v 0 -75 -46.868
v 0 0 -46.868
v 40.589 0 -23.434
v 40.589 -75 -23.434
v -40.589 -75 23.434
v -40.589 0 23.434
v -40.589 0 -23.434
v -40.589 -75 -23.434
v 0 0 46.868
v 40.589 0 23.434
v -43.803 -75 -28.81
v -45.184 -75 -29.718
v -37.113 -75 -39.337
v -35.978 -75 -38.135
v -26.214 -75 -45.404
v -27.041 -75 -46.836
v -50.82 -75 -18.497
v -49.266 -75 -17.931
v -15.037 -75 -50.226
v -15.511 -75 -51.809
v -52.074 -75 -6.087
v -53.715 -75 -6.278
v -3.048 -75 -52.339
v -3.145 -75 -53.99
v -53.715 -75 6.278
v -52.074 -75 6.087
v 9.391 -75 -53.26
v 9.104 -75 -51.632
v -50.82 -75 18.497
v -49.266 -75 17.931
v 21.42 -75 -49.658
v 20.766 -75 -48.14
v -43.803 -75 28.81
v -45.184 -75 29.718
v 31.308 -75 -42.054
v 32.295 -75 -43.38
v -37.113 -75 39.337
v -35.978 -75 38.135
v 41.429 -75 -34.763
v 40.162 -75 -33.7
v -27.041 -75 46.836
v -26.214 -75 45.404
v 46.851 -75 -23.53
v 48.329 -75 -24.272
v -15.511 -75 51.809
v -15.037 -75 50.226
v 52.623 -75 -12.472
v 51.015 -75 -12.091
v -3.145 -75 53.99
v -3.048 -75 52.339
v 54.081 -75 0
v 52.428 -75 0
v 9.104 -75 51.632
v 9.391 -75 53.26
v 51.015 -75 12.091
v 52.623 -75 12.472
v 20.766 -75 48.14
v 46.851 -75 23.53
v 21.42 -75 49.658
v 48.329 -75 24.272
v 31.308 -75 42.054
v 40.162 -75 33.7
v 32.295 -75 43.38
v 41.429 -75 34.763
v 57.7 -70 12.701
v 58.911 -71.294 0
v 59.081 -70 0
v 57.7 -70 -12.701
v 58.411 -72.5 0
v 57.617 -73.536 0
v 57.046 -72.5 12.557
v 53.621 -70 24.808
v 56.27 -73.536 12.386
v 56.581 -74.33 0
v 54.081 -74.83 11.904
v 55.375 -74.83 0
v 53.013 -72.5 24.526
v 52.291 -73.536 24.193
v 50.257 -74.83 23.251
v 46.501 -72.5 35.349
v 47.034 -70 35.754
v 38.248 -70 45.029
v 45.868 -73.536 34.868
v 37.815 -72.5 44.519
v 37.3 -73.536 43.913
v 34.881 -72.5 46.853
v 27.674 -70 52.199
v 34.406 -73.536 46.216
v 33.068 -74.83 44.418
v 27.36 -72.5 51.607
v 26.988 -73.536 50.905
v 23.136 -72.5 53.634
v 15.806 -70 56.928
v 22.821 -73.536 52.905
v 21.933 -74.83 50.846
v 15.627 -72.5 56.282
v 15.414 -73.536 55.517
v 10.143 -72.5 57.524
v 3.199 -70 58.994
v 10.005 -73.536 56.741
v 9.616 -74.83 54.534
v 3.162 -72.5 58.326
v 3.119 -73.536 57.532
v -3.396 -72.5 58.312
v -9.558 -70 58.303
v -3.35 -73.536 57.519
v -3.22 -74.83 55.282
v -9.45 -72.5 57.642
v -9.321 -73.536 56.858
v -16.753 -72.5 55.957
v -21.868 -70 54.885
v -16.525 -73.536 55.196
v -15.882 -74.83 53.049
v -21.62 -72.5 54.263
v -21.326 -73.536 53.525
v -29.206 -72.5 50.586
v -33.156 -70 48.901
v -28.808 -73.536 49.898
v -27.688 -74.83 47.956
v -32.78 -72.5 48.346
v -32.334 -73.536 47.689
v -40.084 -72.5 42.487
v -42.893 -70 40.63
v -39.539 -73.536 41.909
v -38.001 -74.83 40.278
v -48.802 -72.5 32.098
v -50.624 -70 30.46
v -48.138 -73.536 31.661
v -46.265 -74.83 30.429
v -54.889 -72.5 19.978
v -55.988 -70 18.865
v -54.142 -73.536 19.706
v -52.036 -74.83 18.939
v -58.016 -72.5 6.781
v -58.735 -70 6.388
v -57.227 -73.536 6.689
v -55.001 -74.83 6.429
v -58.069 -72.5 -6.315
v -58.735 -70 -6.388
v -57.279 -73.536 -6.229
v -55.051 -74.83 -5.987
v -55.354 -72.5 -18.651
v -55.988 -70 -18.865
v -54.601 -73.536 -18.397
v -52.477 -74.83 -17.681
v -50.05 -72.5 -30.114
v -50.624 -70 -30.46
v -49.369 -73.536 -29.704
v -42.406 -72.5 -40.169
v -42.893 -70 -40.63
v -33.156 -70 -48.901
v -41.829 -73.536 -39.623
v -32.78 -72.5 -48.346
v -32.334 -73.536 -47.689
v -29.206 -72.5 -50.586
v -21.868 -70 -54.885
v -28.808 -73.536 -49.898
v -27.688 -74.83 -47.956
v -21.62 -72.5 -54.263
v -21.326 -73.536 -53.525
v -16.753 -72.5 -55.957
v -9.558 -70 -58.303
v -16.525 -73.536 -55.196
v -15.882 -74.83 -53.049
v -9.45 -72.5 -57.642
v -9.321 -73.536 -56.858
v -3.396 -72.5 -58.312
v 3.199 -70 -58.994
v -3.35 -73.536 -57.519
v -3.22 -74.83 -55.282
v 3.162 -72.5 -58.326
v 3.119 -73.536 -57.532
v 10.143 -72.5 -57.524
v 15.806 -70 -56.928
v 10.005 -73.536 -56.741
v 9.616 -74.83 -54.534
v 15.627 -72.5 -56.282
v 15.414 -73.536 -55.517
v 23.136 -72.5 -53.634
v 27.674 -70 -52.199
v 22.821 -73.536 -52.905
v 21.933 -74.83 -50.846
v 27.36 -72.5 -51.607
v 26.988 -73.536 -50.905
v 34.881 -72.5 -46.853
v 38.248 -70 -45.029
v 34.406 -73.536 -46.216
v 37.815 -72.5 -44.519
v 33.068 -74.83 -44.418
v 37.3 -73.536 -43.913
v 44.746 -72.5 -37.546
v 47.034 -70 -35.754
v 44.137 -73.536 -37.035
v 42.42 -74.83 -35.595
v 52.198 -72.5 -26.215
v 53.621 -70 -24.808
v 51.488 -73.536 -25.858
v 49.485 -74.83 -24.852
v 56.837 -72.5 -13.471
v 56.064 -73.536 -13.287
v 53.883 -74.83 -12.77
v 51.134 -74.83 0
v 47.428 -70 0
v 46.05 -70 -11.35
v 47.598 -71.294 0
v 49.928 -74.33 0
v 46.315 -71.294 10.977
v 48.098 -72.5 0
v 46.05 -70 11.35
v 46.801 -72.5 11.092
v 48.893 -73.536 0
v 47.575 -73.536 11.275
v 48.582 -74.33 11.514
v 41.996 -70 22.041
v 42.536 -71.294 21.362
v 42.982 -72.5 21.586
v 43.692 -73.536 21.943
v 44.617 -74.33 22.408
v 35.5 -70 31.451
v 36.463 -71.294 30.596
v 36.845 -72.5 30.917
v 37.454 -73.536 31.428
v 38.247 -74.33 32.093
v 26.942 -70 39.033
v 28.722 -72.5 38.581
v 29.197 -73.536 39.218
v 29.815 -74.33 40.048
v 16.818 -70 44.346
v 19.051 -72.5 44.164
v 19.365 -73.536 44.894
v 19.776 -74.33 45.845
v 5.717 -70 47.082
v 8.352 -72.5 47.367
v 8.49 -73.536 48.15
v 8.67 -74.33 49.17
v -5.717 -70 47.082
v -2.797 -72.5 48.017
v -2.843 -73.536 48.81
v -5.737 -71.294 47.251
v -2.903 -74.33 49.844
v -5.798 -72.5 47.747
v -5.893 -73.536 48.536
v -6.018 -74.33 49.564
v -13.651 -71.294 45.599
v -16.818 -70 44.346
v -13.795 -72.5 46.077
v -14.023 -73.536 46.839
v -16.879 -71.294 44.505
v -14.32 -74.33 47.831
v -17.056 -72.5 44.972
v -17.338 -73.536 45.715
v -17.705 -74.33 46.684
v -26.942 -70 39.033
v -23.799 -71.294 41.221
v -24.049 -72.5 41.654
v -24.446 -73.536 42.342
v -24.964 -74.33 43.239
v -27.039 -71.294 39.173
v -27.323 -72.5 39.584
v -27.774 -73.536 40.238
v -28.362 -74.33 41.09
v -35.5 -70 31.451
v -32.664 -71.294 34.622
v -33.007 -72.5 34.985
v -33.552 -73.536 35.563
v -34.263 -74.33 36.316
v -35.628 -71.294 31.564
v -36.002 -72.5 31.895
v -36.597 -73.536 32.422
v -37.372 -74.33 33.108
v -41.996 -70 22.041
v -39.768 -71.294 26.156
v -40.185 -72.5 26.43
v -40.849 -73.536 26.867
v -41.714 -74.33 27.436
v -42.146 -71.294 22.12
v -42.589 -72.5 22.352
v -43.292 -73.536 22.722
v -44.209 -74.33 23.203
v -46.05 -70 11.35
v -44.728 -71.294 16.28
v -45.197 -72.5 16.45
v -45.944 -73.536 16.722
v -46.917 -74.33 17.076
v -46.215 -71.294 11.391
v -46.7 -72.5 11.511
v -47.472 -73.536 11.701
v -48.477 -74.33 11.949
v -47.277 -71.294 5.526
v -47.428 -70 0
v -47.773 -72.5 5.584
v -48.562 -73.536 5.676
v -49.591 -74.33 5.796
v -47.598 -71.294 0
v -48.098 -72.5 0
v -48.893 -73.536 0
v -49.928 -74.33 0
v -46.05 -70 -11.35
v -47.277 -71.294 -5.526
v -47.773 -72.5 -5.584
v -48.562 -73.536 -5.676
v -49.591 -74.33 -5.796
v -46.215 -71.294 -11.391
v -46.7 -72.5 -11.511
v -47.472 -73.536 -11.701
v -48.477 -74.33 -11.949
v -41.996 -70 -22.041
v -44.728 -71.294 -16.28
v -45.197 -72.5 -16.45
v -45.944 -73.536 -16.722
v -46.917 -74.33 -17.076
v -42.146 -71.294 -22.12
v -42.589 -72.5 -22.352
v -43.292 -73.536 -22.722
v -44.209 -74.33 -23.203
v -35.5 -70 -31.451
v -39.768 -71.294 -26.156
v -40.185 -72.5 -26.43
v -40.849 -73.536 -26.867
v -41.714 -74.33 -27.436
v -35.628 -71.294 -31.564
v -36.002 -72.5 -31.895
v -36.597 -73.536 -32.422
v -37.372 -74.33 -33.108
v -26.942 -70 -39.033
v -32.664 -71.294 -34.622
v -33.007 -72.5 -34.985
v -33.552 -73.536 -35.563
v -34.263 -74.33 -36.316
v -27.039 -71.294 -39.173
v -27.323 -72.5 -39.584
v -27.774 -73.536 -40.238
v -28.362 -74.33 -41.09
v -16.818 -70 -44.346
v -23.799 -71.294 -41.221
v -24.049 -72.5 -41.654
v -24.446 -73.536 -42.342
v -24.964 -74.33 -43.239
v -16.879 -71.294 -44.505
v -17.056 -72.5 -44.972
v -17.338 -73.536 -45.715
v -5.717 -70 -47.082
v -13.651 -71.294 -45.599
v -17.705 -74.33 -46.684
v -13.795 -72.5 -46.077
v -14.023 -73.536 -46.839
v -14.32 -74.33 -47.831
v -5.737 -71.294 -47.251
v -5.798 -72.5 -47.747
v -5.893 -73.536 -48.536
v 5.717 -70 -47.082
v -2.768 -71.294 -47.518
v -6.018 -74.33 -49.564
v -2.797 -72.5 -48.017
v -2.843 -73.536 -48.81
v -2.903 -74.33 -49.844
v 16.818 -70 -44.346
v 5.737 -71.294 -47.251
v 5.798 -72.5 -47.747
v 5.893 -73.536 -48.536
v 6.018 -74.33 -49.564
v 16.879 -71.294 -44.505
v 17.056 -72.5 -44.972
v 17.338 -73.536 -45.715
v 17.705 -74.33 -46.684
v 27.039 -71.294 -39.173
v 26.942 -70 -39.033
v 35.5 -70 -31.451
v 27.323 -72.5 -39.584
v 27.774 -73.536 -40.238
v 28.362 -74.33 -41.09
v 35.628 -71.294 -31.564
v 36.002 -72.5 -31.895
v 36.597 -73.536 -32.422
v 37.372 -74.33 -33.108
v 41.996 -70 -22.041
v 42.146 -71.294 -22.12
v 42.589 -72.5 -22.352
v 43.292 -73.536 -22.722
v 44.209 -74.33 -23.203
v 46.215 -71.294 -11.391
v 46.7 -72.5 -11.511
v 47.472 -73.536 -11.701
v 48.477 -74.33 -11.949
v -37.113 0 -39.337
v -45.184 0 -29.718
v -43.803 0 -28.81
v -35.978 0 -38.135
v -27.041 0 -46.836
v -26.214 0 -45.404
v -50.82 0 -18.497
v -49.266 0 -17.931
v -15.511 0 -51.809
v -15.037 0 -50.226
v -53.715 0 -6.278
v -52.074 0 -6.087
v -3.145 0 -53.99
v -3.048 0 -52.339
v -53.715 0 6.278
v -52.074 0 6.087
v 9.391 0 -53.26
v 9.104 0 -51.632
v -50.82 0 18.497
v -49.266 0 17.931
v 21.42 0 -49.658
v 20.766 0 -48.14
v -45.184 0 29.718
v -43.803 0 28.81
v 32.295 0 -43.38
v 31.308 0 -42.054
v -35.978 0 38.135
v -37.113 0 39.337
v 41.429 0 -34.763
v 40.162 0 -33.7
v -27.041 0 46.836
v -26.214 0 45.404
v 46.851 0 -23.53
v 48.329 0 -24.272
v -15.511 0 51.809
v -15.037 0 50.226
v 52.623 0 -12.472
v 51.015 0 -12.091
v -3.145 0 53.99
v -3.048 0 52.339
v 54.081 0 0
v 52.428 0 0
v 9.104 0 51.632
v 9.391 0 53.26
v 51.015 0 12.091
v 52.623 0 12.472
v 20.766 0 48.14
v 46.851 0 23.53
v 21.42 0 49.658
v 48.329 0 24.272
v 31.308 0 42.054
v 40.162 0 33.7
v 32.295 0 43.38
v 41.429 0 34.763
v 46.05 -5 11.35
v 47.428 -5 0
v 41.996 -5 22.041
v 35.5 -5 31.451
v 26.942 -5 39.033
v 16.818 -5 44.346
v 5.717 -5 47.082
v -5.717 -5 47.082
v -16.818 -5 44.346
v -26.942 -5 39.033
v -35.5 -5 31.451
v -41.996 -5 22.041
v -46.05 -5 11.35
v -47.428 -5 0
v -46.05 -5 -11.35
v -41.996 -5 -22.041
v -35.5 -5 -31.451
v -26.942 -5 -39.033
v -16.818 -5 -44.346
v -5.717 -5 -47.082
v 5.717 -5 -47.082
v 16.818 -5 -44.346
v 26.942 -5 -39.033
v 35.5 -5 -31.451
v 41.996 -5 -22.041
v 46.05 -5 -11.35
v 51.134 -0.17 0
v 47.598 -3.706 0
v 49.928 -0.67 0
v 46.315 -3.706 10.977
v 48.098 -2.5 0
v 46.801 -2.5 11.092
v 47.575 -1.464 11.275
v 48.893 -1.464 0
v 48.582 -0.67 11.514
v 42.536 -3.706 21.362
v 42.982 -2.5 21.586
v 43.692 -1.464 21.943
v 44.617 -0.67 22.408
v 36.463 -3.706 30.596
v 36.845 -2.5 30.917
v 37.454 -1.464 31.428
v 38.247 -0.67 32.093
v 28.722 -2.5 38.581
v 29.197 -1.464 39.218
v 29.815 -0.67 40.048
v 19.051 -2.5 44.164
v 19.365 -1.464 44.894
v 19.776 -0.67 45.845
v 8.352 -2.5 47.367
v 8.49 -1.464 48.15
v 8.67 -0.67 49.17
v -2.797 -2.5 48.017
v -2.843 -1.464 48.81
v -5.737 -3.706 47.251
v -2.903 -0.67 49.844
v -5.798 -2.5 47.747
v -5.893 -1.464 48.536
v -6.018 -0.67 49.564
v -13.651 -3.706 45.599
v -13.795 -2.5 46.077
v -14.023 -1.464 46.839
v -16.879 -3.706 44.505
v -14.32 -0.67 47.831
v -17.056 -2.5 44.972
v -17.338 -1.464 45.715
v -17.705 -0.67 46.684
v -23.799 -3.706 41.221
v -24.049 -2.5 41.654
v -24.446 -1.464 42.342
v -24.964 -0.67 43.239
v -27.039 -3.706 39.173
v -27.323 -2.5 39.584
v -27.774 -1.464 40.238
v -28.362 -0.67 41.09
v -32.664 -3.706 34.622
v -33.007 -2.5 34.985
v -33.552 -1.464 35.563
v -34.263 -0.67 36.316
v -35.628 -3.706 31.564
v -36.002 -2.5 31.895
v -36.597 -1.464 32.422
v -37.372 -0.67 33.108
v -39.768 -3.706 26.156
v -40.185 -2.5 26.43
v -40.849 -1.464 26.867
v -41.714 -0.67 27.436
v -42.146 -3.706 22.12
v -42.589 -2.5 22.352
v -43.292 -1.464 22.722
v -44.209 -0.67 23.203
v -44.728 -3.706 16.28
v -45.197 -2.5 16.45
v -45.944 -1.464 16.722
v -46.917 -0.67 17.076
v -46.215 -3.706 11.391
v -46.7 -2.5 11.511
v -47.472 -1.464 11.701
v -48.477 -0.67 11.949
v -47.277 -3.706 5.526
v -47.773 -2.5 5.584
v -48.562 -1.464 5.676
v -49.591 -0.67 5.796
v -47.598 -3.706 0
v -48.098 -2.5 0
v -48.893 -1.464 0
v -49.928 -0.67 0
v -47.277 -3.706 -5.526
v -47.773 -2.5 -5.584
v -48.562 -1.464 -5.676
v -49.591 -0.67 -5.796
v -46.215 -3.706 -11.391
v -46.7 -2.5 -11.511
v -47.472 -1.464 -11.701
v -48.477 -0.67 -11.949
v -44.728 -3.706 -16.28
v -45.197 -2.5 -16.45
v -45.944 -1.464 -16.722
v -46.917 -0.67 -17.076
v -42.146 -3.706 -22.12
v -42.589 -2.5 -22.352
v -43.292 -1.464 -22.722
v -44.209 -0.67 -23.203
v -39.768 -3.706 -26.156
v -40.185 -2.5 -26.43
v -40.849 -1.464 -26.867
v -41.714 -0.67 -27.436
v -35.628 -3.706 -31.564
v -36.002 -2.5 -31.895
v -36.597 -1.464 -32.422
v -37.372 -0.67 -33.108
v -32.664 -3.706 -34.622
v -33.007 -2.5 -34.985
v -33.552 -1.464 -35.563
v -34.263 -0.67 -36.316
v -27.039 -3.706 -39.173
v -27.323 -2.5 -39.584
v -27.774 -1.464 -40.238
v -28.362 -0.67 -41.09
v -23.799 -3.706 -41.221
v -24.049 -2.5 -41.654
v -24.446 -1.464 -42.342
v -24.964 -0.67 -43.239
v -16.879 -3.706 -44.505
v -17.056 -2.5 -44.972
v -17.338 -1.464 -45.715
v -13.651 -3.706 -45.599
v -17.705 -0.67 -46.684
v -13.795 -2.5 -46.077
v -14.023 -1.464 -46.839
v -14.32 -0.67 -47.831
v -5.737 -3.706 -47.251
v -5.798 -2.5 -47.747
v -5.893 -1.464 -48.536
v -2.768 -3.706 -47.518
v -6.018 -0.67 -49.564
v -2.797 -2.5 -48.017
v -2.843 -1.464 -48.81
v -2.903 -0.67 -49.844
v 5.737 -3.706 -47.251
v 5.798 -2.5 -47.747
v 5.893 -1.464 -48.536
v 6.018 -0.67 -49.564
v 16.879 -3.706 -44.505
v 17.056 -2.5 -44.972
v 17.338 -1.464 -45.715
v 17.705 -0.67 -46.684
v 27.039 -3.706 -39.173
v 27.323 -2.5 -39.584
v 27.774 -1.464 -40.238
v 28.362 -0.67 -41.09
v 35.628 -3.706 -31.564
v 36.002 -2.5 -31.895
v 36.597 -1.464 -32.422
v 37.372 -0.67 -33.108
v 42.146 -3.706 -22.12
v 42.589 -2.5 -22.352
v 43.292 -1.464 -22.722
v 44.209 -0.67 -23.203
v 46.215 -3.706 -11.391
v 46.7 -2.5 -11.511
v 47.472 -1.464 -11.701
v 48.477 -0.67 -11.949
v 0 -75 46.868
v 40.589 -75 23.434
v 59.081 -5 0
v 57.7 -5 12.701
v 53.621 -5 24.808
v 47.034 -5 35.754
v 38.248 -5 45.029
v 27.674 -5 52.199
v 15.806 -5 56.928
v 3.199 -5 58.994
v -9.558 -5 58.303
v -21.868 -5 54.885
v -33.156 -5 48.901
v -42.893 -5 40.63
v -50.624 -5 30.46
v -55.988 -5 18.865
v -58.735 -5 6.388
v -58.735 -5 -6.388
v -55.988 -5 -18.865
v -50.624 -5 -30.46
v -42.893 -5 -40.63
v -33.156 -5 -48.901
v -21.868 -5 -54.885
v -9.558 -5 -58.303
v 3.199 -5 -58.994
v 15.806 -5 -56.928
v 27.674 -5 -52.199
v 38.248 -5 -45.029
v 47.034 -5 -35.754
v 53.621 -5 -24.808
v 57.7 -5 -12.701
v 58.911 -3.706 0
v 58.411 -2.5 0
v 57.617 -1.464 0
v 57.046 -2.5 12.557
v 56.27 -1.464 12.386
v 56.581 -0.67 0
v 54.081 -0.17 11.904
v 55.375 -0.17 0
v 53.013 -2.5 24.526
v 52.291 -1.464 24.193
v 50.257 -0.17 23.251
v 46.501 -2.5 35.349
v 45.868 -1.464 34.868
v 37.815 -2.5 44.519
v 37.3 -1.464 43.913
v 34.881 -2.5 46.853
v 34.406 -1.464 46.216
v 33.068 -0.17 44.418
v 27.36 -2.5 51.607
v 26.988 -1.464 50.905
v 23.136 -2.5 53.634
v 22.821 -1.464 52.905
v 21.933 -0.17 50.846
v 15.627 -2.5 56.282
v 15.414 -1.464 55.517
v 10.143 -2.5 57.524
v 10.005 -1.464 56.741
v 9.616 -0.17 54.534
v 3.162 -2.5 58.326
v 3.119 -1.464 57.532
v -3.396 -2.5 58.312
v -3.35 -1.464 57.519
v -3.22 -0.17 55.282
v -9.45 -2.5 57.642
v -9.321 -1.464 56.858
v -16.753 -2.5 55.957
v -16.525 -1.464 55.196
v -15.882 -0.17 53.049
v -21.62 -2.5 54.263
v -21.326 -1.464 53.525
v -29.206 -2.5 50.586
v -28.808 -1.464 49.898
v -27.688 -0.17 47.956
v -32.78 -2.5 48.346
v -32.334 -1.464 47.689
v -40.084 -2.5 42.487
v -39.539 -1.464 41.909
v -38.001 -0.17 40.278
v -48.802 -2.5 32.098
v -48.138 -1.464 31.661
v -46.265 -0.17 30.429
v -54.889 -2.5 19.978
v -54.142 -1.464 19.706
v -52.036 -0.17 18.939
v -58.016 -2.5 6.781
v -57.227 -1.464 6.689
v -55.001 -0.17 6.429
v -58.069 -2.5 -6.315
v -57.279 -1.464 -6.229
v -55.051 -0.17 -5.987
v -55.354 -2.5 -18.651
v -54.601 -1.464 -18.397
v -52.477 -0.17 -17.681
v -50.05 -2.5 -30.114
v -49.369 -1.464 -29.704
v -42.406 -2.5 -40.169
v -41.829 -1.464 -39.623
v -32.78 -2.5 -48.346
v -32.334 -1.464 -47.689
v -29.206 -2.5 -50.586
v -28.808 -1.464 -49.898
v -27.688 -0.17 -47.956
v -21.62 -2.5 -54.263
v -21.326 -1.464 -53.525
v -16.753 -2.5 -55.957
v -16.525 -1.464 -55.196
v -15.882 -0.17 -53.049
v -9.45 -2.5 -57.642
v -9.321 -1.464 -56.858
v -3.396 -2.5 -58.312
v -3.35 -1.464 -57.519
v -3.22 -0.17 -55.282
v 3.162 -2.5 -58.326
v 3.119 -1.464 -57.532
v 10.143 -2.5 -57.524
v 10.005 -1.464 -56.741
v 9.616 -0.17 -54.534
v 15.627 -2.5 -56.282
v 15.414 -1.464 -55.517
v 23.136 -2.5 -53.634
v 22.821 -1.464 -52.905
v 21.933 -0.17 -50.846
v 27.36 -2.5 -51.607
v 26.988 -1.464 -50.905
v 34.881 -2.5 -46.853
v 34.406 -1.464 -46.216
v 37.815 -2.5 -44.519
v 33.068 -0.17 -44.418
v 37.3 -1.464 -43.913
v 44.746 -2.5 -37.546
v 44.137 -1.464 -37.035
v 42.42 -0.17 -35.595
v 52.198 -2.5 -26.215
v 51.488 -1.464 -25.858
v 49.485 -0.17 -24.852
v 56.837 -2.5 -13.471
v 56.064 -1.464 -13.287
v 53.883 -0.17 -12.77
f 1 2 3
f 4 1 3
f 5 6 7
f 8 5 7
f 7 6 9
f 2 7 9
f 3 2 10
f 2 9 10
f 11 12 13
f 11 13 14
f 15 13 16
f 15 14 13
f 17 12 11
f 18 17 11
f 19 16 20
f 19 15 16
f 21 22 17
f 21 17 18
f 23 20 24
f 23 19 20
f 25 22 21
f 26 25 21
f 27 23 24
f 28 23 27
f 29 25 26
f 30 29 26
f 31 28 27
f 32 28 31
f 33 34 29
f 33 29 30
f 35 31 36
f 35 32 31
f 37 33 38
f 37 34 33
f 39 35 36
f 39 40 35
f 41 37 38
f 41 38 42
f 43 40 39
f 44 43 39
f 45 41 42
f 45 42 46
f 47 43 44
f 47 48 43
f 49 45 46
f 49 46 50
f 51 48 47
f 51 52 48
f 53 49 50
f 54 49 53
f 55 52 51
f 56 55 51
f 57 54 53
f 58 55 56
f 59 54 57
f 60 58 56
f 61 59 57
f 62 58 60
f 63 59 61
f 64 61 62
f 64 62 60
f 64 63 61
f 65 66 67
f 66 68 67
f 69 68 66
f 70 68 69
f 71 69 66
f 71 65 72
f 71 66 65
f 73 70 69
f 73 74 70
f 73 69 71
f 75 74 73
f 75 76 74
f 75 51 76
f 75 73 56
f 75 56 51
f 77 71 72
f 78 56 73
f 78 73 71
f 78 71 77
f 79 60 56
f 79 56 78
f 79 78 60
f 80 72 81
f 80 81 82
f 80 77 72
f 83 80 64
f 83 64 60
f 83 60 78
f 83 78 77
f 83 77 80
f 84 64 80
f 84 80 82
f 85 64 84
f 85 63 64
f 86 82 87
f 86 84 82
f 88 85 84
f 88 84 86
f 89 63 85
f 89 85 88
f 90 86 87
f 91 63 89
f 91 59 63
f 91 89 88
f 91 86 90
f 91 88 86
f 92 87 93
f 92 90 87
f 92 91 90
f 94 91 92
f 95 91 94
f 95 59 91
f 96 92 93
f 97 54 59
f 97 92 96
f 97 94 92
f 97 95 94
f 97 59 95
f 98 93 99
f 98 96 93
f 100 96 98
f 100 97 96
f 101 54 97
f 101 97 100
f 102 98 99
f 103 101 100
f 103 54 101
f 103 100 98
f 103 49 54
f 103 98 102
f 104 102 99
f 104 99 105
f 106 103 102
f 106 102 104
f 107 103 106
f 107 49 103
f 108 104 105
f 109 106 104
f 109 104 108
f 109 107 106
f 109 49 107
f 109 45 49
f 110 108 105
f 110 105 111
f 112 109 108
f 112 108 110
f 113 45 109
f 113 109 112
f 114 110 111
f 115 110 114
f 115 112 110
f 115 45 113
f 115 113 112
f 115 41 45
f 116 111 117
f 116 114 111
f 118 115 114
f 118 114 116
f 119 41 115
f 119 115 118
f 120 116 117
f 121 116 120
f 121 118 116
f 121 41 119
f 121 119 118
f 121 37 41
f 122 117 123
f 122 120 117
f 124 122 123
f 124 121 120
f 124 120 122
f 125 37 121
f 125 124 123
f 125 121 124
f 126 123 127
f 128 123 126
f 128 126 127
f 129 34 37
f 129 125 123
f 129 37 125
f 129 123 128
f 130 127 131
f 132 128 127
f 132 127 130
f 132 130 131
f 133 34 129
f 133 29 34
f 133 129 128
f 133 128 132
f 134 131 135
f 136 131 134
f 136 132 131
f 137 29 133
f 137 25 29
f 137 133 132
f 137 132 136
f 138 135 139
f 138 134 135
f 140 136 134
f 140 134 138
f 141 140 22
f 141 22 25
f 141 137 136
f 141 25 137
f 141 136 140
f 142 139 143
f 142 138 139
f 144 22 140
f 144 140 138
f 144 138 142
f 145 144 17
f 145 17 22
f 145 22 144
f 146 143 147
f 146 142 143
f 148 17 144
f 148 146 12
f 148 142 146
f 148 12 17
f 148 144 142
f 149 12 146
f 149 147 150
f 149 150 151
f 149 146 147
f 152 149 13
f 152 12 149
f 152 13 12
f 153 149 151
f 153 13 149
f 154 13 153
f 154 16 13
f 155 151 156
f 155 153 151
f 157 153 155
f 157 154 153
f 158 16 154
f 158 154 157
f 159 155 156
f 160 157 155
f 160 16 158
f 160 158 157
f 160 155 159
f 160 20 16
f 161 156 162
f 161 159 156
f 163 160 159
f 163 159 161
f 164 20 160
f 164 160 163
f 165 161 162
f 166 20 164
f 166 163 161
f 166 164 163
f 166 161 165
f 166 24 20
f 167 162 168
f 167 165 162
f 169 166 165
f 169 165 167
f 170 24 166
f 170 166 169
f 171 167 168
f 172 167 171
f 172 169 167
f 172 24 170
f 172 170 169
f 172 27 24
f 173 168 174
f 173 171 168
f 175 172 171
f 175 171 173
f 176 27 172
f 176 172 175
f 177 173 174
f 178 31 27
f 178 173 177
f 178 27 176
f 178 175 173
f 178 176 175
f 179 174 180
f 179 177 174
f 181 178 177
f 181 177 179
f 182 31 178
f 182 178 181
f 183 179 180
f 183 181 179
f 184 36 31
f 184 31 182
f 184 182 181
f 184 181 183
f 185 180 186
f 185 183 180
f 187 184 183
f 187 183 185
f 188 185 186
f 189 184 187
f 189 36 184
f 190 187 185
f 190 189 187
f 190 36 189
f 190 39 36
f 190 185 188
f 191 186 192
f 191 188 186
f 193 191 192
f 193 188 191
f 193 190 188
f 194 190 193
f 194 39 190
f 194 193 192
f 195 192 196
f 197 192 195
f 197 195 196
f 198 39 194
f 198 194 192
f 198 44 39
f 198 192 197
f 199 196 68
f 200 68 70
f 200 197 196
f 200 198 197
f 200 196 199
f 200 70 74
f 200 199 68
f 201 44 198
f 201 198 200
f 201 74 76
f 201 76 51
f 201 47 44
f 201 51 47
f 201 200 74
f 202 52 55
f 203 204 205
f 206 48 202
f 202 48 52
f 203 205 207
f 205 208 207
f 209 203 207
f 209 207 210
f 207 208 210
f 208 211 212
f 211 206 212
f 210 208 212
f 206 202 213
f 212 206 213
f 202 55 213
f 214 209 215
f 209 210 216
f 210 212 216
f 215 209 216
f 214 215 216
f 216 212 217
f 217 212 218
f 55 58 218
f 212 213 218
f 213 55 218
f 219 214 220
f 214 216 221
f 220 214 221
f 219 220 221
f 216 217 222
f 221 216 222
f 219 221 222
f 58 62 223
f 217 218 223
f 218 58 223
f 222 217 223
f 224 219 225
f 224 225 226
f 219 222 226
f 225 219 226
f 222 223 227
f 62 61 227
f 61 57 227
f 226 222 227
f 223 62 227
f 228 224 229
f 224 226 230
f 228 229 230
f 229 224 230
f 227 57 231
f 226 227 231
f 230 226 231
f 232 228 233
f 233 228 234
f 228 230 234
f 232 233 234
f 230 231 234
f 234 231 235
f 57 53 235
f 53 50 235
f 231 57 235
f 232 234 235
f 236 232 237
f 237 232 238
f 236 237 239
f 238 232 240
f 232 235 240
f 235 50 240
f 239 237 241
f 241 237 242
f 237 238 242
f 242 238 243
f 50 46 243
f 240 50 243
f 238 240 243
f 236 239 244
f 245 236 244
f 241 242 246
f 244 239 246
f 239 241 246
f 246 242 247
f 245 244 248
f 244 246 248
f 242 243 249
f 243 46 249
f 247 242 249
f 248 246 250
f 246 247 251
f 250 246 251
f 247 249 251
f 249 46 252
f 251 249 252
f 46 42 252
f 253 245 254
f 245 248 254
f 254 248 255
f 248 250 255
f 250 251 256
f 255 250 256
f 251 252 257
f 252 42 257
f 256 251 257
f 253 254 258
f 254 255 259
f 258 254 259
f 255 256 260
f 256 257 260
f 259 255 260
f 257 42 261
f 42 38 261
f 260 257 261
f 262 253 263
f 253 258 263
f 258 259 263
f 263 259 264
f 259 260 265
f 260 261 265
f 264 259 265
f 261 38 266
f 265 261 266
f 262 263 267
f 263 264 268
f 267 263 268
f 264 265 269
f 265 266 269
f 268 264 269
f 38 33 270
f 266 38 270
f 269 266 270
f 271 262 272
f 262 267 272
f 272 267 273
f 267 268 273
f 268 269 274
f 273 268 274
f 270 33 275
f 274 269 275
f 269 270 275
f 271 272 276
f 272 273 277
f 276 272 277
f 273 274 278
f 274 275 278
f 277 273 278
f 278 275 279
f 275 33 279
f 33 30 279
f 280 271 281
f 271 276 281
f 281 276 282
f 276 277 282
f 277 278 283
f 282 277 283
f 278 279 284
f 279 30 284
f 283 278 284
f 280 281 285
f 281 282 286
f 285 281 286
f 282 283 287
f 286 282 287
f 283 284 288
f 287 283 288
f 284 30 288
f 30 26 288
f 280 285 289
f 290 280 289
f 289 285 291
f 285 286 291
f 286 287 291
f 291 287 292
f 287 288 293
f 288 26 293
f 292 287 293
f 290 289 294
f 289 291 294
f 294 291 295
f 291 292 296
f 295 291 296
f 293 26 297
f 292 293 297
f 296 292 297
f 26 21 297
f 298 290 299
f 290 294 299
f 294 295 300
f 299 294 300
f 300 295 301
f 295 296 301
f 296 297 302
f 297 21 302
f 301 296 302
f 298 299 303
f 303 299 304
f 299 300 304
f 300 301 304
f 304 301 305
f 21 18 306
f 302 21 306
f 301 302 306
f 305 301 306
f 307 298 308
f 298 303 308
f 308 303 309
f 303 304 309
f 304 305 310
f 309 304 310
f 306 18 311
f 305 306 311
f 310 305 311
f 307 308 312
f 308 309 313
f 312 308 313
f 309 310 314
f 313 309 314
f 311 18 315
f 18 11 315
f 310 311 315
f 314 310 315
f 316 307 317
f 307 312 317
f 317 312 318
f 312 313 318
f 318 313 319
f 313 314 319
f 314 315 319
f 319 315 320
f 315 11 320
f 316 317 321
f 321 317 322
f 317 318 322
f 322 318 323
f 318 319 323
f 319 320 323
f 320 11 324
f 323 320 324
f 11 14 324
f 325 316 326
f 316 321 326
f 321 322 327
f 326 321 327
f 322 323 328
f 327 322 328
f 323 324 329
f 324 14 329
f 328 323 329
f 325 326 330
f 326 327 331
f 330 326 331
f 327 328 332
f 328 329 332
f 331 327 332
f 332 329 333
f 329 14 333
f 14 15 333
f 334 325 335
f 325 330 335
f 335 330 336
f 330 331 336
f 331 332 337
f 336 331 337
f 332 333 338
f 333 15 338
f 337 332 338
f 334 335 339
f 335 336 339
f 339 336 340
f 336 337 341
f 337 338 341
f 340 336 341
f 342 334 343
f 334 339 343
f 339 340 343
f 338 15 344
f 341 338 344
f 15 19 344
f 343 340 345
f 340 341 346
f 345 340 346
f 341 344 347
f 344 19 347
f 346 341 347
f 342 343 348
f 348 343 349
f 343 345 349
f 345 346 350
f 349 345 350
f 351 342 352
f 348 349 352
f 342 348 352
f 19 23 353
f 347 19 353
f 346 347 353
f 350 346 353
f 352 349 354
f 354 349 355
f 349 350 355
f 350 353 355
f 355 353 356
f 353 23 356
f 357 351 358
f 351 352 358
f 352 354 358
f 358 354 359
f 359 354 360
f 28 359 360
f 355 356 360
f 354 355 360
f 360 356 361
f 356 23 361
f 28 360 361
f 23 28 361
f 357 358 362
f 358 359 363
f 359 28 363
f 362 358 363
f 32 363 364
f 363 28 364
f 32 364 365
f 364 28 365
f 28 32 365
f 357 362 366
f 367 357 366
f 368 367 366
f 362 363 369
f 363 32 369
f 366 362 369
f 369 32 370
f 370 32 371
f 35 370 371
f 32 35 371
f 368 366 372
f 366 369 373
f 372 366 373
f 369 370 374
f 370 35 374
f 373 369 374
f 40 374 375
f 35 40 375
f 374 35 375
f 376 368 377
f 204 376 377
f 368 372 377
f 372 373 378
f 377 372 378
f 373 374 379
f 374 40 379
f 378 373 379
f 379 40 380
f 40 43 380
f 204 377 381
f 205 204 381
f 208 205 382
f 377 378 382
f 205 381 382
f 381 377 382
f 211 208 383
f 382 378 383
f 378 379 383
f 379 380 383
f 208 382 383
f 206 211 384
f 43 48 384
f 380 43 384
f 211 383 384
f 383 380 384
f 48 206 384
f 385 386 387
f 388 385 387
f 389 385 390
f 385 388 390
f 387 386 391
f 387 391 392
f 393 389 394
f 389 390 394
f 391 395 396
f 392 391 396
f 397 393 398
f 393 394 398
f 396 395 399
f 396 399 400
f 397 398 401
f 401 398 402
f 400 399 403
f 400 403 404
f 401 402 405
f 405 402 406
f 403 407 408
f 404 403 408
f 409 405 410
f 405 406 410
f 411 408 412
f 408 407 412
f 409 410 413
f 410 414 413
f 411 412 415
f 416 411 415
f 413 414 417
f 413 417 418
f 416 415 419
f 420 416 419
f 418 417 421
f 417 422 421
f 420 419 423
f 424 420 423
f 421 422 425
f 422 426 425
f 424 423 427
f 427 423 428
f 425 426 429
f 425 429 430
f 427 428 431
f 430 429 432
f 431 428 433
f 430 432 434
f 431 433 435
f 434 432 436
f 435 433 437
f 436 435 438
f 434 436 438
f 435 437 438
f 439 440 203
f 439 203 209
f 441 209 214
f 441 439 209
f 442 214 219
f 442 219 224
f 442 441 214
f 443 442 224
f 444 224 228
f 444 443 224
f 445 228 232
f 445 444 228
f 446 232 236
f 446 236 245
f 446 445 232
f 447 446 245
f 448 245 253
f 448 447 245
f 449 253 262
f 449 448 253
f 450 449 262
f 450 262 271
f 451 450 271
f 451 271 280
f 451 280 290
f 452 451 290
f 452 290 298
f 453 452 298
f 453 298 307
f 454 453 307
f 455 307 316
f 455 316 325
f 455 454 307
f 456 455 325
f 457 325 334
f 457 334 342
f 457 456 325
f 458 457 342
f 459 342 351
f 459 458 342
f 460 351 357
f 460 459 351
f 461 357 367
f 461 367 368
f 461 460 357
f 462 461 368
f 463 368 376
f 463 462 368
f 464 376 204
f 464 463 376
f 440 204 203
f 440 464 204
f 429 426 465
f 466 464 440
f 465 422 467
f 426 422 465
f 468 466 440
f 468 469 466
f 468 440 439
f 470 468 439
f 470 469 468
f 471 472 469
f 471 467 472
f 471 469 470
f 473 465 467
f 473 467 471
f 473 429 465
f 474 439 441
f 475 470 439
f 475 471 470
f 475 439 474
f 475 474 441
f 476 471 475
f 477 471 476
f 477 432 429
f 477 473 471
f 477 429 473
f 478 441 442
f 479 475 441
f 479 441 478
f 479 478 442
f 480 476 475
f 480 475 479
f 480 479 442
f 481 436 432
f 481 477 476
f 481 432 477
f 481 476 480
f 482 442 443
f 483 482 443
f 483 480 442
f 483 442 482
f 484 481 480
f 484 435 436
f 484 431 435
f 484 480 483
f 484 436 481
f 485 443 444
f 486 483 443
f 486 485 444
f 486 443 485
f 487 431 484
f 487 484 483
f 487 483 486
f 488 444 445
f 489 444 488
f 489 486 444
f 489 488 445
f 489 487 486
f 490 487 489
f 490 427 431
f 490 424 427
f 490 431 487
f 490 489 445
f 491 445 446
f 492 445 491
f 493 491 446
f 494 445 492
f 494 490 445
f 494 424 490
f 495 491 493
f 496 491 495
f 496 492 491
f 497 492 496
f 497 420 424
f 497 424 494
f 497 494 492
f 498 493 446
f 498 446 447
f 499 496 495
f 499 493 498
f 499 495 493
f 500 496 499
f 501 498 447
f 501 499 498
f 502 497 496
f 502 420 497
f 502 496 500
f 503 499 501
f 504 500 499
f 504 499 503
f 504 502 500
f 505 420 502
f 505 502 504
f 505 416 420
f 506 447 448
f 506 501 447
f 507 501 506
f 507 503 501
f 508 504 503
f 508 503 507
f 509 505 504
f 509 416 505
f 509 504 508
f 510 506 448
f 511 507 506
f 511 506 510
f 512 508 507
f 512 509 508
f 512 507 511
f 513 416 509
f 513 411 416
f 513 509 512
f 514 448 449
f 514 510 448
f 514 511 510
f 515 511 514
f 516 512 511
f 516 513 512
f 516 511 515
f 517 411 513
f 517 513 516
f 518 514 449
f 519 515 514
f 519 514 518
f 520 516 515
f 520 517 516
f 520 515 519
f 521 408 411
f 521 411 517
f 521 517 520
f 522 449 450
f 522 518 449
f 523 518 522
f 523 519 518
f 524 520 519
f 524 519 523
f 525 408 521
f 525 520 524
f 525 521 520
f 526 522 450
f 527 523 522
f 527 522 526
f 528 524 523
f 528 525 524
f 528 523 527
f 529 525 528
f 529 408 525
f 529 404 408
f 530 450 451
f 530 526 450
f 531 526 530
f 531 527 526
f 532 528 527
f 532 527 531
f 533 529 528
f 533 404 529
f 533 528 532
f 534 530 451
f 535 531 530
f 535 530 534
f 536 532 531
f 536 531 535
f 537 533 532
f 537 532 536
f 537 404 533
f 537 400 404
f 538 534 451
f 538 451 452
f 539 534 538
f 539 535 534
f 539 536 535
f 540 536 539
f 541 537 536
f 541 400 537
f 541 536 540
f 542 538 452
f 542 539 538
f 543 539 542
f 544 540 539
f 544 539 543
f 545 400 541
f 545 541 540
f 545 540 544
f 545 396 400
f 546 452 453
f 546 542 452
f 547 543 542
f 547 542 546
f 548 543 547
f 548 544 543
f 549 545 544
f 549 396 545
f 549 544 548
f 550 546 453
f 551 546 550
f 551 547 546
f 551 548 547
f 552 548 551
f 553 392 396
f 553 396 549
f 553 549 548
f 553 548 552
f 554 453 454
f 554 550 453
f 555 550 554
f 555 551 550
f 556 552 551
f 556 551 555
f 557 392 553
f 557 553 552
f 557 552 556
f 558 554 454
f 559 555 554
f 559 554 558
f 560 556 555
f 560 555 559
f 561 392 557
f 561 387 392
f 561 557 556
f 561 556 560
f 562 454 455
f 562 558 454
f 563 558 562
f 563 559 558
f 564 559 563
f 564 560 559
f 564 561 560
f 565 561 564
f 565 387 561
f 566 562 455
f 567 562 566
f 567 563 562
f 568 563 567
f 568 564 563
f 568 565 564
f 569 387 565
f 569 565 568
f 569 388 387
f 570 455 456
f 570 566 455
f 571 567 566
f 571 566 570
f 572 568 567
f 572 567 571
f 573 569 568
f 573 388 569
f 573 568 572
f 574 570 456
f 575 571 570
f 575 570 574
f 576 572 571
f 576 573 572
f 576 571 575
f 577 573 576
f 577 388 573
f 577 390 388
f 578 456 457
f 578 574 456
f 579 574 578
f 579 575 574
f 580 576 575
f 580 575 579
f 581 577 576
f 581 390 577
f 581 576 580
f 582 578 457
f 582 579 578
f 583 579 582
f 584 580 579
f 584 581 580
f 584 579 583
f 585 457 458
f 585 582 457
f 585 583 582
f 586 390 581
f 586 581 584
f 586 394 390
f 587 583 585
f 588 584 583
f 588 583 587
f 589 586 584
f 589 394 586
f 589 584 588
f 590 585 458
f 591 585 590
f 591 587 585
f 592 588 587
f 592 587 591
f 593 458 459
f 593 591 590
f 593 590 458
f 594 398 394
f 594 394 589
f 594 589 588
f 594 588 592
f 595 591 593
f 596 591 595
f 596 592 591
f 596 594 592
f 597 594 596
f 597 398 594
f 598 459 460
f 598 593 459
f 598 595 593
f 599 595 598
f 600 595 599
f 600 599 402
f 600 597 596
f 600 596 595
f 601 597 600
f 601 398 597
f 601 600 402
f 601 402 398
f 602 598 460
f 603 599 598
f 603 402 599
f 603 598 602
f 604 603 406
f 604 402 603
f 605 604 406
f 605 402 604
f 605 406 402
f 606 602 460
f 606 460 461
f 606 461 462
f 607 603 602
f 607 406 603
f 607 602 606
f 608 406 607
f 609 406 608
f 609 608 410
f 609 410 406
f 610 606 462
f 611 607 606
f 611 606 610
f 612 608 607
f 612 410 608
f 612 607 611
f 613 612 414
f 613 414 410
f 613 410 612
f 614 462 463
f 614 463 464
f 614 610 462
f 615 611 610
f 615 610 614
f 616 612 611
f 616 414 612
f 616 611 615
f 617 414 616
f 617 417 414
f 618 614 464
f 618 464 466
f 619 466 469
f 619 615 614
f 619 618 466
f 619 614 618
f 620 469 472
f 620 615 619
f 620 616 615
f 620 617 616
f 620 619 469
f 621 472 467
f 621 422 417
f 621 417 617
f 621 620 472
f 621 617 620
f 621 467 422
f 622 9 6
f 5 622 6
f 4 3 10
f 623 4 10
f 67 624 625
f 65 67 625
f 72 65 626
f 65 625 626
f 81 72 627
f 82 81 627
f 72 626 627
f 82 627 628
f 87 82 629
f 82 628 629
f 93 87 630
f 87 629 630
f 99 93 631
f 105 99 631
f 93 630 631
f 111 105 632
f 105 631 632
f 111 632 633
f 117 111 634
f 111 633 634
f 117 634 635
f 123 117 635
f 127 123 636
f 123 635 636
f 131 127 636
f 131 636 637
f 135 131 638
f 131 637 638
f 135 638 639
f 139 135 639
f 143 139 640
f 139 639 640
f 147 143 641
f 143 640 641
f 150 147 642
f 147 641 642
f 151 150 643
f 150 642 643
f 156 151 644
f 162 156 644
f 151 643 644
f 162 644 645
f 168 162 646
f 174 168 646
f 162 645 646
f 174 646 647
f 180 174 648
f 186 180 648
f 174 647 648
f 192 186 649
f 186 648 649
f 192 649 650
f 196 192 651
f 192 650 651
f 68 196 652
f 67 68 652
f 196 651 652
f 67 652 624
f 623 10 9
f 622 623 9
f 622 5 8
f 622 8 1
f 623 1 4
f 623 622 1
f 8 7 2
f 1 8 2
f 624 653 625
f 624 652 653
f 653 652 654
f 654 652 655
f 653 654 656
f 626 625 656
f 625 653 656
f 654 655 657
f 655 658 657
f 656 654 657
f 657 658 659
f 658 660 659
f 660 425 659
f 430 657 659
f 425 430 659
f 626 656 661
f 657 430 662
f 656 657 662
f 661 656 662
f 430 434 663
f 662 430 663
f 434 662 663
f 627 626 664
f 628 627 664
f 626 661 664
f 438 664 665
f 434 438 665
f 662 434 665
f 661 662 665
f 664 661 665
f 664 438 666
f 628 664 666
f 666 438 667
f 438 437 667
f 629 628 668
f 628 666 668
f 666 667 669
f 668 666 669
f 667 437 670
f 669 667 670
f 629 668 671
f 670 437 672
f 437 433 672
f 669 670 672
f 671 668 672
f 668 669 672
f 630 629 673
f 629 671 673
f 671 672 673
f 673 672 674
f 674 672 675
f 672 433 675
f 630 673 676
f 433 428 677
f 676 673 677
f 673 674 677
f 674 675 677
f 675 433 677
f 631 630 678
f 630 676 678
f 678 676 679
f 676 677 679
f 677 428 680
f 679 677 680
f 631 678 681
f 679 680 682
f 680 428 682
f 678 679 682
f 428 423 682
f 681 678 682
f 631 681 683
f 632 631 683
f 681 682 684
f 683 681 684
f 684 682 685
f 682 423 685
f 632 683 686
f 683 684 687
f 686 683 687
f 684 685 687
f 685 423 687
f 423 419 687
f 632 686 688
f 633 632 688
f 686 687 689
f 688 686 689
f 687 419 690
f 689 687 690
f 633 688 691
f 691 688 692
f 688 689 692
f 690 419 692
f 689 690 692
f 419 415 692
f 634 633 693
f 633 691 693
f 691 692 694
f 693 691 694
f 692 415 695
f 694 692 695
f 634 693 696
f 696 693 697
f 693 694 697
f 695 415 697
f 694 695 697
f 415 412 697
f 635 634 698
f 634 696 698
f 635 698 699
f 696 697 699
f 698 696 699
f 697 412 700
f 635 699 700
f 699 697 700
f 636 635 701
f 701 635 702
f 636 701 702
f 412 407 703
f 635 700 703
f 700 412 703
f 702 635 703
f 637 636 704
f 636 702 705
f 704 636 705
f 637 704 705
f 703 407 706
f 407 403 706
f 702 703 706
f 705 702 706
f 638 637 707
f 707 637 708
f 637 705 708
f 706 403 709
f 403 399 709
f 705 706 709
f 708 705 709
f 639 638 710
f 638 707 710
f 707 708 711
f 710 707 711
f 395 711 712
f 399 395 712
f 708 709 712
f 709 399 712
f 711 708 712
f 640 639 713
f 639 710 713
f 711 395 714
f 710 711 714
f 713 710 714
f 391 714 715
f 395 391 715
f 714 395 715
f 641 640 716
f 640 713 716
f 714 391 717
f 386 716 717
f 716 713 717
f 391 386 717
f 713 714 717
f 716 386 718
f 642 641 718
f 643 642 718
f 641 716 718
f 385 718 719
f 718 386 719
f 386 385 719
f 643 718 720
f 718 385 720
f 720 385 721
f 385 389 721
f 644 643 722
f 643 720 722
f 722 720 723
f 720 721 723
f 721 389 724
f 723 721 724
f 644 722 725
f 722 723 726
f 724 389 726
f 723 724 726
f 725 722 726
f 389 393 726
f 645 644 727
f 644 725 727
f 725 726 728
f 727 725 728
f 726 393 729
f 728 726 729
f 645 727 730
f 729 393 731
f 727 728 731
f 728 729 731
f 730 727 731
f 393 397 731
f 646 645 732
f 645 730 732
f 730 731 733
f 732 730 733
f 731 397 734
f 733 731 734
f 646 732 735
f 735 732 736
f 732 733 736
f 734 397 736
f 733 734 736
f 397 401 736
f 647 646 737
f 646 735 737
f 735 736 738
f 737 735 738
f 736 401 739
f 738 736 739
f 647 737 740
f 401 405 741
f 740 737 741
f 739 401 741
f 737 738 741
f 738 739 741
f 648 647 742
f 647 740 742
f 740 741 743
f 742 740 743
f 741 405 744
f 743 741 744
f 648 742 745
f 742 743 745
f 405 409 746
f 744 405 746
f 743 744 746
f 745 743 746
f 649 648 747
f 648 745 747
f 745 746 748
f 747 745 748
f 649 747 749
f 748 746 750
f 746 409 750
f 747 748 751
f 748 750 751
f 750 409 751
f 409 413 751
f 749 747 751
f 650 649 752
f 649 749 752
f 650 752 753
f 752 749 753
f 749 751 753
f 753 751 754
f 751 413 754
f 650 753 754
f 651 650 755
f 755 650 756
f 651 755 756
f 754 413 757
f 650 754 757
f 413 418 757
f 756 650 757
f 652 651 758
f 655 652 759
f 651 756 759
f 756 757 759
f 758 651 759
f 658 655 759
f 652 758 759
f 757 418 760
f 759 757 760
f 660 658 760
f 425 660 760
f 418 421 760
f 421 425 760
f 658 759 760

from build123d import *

# Parameters (mm, degrees)
F0_R     = 59.0811363779
F0_R_2   = 47.4281042848
F1_DEPTH = 75
F2_R     = 5
F5_DEPTH = 75


with BuildPart() as f1:
    # F0 (on Front) → F1 (new body)
    with BuildSketch(Plane.XZ):
        Circle(F0_R)
        Circle(F0_R_2, mode=Mode.SUBTRACT)
    extrude(amount=F1_DEPTH)

    # F2
    f2_edges = [f1.edges().sort_by_distance(p)[0] for p in [
        (-59.081136, -75, 0),
        (-47.428104, -75, 0),
        (-59.081136, 0, 0),
        (-47.428104, 0, 0),
    ]]
    fillet(f2_edges, radius=F2_R)


with BuildPart() as f5:
    # F4 (on Front) → F5 (new body)
    with BuildSketch(Plane.XZ):
        Polygon((39.2727144063, 23.9146705717), (-0.5921763534, 0.3075277073), (39.2727144063, -22.5982666016), align=None)
    extrude(amount=F5_DEPTH)


with BuildPart() as f5b:
    # F4 (on Front) → F5, piece 2 (new body)
    with BuildSketch(Plane.XZ):
        Polygon((-0.5921763534, 0.3075277073), (-40.1503182948, 23.0370685458), (-39.2727144063, -22.5982666016), align=None)
    extrude(amount=F5_DEPTH)


with BuildPart() as f5c:
    # F3 (on Front) → F5, piece 3 (new body)
    with BuildSketch(Plane.XZ):
        Polygon((40.5891165137, -23.4341373454), (40.5891165137, 23.4341373454), (0, 46.8682746907), (-40.5891165137, 23.4341373454), (-40.5891165137, -23.4341373454), (0, -46.8682746907), align=None)
    extrude(amount=F5_DEPTH)


solid = Compound([f1.part, f5c.part])
